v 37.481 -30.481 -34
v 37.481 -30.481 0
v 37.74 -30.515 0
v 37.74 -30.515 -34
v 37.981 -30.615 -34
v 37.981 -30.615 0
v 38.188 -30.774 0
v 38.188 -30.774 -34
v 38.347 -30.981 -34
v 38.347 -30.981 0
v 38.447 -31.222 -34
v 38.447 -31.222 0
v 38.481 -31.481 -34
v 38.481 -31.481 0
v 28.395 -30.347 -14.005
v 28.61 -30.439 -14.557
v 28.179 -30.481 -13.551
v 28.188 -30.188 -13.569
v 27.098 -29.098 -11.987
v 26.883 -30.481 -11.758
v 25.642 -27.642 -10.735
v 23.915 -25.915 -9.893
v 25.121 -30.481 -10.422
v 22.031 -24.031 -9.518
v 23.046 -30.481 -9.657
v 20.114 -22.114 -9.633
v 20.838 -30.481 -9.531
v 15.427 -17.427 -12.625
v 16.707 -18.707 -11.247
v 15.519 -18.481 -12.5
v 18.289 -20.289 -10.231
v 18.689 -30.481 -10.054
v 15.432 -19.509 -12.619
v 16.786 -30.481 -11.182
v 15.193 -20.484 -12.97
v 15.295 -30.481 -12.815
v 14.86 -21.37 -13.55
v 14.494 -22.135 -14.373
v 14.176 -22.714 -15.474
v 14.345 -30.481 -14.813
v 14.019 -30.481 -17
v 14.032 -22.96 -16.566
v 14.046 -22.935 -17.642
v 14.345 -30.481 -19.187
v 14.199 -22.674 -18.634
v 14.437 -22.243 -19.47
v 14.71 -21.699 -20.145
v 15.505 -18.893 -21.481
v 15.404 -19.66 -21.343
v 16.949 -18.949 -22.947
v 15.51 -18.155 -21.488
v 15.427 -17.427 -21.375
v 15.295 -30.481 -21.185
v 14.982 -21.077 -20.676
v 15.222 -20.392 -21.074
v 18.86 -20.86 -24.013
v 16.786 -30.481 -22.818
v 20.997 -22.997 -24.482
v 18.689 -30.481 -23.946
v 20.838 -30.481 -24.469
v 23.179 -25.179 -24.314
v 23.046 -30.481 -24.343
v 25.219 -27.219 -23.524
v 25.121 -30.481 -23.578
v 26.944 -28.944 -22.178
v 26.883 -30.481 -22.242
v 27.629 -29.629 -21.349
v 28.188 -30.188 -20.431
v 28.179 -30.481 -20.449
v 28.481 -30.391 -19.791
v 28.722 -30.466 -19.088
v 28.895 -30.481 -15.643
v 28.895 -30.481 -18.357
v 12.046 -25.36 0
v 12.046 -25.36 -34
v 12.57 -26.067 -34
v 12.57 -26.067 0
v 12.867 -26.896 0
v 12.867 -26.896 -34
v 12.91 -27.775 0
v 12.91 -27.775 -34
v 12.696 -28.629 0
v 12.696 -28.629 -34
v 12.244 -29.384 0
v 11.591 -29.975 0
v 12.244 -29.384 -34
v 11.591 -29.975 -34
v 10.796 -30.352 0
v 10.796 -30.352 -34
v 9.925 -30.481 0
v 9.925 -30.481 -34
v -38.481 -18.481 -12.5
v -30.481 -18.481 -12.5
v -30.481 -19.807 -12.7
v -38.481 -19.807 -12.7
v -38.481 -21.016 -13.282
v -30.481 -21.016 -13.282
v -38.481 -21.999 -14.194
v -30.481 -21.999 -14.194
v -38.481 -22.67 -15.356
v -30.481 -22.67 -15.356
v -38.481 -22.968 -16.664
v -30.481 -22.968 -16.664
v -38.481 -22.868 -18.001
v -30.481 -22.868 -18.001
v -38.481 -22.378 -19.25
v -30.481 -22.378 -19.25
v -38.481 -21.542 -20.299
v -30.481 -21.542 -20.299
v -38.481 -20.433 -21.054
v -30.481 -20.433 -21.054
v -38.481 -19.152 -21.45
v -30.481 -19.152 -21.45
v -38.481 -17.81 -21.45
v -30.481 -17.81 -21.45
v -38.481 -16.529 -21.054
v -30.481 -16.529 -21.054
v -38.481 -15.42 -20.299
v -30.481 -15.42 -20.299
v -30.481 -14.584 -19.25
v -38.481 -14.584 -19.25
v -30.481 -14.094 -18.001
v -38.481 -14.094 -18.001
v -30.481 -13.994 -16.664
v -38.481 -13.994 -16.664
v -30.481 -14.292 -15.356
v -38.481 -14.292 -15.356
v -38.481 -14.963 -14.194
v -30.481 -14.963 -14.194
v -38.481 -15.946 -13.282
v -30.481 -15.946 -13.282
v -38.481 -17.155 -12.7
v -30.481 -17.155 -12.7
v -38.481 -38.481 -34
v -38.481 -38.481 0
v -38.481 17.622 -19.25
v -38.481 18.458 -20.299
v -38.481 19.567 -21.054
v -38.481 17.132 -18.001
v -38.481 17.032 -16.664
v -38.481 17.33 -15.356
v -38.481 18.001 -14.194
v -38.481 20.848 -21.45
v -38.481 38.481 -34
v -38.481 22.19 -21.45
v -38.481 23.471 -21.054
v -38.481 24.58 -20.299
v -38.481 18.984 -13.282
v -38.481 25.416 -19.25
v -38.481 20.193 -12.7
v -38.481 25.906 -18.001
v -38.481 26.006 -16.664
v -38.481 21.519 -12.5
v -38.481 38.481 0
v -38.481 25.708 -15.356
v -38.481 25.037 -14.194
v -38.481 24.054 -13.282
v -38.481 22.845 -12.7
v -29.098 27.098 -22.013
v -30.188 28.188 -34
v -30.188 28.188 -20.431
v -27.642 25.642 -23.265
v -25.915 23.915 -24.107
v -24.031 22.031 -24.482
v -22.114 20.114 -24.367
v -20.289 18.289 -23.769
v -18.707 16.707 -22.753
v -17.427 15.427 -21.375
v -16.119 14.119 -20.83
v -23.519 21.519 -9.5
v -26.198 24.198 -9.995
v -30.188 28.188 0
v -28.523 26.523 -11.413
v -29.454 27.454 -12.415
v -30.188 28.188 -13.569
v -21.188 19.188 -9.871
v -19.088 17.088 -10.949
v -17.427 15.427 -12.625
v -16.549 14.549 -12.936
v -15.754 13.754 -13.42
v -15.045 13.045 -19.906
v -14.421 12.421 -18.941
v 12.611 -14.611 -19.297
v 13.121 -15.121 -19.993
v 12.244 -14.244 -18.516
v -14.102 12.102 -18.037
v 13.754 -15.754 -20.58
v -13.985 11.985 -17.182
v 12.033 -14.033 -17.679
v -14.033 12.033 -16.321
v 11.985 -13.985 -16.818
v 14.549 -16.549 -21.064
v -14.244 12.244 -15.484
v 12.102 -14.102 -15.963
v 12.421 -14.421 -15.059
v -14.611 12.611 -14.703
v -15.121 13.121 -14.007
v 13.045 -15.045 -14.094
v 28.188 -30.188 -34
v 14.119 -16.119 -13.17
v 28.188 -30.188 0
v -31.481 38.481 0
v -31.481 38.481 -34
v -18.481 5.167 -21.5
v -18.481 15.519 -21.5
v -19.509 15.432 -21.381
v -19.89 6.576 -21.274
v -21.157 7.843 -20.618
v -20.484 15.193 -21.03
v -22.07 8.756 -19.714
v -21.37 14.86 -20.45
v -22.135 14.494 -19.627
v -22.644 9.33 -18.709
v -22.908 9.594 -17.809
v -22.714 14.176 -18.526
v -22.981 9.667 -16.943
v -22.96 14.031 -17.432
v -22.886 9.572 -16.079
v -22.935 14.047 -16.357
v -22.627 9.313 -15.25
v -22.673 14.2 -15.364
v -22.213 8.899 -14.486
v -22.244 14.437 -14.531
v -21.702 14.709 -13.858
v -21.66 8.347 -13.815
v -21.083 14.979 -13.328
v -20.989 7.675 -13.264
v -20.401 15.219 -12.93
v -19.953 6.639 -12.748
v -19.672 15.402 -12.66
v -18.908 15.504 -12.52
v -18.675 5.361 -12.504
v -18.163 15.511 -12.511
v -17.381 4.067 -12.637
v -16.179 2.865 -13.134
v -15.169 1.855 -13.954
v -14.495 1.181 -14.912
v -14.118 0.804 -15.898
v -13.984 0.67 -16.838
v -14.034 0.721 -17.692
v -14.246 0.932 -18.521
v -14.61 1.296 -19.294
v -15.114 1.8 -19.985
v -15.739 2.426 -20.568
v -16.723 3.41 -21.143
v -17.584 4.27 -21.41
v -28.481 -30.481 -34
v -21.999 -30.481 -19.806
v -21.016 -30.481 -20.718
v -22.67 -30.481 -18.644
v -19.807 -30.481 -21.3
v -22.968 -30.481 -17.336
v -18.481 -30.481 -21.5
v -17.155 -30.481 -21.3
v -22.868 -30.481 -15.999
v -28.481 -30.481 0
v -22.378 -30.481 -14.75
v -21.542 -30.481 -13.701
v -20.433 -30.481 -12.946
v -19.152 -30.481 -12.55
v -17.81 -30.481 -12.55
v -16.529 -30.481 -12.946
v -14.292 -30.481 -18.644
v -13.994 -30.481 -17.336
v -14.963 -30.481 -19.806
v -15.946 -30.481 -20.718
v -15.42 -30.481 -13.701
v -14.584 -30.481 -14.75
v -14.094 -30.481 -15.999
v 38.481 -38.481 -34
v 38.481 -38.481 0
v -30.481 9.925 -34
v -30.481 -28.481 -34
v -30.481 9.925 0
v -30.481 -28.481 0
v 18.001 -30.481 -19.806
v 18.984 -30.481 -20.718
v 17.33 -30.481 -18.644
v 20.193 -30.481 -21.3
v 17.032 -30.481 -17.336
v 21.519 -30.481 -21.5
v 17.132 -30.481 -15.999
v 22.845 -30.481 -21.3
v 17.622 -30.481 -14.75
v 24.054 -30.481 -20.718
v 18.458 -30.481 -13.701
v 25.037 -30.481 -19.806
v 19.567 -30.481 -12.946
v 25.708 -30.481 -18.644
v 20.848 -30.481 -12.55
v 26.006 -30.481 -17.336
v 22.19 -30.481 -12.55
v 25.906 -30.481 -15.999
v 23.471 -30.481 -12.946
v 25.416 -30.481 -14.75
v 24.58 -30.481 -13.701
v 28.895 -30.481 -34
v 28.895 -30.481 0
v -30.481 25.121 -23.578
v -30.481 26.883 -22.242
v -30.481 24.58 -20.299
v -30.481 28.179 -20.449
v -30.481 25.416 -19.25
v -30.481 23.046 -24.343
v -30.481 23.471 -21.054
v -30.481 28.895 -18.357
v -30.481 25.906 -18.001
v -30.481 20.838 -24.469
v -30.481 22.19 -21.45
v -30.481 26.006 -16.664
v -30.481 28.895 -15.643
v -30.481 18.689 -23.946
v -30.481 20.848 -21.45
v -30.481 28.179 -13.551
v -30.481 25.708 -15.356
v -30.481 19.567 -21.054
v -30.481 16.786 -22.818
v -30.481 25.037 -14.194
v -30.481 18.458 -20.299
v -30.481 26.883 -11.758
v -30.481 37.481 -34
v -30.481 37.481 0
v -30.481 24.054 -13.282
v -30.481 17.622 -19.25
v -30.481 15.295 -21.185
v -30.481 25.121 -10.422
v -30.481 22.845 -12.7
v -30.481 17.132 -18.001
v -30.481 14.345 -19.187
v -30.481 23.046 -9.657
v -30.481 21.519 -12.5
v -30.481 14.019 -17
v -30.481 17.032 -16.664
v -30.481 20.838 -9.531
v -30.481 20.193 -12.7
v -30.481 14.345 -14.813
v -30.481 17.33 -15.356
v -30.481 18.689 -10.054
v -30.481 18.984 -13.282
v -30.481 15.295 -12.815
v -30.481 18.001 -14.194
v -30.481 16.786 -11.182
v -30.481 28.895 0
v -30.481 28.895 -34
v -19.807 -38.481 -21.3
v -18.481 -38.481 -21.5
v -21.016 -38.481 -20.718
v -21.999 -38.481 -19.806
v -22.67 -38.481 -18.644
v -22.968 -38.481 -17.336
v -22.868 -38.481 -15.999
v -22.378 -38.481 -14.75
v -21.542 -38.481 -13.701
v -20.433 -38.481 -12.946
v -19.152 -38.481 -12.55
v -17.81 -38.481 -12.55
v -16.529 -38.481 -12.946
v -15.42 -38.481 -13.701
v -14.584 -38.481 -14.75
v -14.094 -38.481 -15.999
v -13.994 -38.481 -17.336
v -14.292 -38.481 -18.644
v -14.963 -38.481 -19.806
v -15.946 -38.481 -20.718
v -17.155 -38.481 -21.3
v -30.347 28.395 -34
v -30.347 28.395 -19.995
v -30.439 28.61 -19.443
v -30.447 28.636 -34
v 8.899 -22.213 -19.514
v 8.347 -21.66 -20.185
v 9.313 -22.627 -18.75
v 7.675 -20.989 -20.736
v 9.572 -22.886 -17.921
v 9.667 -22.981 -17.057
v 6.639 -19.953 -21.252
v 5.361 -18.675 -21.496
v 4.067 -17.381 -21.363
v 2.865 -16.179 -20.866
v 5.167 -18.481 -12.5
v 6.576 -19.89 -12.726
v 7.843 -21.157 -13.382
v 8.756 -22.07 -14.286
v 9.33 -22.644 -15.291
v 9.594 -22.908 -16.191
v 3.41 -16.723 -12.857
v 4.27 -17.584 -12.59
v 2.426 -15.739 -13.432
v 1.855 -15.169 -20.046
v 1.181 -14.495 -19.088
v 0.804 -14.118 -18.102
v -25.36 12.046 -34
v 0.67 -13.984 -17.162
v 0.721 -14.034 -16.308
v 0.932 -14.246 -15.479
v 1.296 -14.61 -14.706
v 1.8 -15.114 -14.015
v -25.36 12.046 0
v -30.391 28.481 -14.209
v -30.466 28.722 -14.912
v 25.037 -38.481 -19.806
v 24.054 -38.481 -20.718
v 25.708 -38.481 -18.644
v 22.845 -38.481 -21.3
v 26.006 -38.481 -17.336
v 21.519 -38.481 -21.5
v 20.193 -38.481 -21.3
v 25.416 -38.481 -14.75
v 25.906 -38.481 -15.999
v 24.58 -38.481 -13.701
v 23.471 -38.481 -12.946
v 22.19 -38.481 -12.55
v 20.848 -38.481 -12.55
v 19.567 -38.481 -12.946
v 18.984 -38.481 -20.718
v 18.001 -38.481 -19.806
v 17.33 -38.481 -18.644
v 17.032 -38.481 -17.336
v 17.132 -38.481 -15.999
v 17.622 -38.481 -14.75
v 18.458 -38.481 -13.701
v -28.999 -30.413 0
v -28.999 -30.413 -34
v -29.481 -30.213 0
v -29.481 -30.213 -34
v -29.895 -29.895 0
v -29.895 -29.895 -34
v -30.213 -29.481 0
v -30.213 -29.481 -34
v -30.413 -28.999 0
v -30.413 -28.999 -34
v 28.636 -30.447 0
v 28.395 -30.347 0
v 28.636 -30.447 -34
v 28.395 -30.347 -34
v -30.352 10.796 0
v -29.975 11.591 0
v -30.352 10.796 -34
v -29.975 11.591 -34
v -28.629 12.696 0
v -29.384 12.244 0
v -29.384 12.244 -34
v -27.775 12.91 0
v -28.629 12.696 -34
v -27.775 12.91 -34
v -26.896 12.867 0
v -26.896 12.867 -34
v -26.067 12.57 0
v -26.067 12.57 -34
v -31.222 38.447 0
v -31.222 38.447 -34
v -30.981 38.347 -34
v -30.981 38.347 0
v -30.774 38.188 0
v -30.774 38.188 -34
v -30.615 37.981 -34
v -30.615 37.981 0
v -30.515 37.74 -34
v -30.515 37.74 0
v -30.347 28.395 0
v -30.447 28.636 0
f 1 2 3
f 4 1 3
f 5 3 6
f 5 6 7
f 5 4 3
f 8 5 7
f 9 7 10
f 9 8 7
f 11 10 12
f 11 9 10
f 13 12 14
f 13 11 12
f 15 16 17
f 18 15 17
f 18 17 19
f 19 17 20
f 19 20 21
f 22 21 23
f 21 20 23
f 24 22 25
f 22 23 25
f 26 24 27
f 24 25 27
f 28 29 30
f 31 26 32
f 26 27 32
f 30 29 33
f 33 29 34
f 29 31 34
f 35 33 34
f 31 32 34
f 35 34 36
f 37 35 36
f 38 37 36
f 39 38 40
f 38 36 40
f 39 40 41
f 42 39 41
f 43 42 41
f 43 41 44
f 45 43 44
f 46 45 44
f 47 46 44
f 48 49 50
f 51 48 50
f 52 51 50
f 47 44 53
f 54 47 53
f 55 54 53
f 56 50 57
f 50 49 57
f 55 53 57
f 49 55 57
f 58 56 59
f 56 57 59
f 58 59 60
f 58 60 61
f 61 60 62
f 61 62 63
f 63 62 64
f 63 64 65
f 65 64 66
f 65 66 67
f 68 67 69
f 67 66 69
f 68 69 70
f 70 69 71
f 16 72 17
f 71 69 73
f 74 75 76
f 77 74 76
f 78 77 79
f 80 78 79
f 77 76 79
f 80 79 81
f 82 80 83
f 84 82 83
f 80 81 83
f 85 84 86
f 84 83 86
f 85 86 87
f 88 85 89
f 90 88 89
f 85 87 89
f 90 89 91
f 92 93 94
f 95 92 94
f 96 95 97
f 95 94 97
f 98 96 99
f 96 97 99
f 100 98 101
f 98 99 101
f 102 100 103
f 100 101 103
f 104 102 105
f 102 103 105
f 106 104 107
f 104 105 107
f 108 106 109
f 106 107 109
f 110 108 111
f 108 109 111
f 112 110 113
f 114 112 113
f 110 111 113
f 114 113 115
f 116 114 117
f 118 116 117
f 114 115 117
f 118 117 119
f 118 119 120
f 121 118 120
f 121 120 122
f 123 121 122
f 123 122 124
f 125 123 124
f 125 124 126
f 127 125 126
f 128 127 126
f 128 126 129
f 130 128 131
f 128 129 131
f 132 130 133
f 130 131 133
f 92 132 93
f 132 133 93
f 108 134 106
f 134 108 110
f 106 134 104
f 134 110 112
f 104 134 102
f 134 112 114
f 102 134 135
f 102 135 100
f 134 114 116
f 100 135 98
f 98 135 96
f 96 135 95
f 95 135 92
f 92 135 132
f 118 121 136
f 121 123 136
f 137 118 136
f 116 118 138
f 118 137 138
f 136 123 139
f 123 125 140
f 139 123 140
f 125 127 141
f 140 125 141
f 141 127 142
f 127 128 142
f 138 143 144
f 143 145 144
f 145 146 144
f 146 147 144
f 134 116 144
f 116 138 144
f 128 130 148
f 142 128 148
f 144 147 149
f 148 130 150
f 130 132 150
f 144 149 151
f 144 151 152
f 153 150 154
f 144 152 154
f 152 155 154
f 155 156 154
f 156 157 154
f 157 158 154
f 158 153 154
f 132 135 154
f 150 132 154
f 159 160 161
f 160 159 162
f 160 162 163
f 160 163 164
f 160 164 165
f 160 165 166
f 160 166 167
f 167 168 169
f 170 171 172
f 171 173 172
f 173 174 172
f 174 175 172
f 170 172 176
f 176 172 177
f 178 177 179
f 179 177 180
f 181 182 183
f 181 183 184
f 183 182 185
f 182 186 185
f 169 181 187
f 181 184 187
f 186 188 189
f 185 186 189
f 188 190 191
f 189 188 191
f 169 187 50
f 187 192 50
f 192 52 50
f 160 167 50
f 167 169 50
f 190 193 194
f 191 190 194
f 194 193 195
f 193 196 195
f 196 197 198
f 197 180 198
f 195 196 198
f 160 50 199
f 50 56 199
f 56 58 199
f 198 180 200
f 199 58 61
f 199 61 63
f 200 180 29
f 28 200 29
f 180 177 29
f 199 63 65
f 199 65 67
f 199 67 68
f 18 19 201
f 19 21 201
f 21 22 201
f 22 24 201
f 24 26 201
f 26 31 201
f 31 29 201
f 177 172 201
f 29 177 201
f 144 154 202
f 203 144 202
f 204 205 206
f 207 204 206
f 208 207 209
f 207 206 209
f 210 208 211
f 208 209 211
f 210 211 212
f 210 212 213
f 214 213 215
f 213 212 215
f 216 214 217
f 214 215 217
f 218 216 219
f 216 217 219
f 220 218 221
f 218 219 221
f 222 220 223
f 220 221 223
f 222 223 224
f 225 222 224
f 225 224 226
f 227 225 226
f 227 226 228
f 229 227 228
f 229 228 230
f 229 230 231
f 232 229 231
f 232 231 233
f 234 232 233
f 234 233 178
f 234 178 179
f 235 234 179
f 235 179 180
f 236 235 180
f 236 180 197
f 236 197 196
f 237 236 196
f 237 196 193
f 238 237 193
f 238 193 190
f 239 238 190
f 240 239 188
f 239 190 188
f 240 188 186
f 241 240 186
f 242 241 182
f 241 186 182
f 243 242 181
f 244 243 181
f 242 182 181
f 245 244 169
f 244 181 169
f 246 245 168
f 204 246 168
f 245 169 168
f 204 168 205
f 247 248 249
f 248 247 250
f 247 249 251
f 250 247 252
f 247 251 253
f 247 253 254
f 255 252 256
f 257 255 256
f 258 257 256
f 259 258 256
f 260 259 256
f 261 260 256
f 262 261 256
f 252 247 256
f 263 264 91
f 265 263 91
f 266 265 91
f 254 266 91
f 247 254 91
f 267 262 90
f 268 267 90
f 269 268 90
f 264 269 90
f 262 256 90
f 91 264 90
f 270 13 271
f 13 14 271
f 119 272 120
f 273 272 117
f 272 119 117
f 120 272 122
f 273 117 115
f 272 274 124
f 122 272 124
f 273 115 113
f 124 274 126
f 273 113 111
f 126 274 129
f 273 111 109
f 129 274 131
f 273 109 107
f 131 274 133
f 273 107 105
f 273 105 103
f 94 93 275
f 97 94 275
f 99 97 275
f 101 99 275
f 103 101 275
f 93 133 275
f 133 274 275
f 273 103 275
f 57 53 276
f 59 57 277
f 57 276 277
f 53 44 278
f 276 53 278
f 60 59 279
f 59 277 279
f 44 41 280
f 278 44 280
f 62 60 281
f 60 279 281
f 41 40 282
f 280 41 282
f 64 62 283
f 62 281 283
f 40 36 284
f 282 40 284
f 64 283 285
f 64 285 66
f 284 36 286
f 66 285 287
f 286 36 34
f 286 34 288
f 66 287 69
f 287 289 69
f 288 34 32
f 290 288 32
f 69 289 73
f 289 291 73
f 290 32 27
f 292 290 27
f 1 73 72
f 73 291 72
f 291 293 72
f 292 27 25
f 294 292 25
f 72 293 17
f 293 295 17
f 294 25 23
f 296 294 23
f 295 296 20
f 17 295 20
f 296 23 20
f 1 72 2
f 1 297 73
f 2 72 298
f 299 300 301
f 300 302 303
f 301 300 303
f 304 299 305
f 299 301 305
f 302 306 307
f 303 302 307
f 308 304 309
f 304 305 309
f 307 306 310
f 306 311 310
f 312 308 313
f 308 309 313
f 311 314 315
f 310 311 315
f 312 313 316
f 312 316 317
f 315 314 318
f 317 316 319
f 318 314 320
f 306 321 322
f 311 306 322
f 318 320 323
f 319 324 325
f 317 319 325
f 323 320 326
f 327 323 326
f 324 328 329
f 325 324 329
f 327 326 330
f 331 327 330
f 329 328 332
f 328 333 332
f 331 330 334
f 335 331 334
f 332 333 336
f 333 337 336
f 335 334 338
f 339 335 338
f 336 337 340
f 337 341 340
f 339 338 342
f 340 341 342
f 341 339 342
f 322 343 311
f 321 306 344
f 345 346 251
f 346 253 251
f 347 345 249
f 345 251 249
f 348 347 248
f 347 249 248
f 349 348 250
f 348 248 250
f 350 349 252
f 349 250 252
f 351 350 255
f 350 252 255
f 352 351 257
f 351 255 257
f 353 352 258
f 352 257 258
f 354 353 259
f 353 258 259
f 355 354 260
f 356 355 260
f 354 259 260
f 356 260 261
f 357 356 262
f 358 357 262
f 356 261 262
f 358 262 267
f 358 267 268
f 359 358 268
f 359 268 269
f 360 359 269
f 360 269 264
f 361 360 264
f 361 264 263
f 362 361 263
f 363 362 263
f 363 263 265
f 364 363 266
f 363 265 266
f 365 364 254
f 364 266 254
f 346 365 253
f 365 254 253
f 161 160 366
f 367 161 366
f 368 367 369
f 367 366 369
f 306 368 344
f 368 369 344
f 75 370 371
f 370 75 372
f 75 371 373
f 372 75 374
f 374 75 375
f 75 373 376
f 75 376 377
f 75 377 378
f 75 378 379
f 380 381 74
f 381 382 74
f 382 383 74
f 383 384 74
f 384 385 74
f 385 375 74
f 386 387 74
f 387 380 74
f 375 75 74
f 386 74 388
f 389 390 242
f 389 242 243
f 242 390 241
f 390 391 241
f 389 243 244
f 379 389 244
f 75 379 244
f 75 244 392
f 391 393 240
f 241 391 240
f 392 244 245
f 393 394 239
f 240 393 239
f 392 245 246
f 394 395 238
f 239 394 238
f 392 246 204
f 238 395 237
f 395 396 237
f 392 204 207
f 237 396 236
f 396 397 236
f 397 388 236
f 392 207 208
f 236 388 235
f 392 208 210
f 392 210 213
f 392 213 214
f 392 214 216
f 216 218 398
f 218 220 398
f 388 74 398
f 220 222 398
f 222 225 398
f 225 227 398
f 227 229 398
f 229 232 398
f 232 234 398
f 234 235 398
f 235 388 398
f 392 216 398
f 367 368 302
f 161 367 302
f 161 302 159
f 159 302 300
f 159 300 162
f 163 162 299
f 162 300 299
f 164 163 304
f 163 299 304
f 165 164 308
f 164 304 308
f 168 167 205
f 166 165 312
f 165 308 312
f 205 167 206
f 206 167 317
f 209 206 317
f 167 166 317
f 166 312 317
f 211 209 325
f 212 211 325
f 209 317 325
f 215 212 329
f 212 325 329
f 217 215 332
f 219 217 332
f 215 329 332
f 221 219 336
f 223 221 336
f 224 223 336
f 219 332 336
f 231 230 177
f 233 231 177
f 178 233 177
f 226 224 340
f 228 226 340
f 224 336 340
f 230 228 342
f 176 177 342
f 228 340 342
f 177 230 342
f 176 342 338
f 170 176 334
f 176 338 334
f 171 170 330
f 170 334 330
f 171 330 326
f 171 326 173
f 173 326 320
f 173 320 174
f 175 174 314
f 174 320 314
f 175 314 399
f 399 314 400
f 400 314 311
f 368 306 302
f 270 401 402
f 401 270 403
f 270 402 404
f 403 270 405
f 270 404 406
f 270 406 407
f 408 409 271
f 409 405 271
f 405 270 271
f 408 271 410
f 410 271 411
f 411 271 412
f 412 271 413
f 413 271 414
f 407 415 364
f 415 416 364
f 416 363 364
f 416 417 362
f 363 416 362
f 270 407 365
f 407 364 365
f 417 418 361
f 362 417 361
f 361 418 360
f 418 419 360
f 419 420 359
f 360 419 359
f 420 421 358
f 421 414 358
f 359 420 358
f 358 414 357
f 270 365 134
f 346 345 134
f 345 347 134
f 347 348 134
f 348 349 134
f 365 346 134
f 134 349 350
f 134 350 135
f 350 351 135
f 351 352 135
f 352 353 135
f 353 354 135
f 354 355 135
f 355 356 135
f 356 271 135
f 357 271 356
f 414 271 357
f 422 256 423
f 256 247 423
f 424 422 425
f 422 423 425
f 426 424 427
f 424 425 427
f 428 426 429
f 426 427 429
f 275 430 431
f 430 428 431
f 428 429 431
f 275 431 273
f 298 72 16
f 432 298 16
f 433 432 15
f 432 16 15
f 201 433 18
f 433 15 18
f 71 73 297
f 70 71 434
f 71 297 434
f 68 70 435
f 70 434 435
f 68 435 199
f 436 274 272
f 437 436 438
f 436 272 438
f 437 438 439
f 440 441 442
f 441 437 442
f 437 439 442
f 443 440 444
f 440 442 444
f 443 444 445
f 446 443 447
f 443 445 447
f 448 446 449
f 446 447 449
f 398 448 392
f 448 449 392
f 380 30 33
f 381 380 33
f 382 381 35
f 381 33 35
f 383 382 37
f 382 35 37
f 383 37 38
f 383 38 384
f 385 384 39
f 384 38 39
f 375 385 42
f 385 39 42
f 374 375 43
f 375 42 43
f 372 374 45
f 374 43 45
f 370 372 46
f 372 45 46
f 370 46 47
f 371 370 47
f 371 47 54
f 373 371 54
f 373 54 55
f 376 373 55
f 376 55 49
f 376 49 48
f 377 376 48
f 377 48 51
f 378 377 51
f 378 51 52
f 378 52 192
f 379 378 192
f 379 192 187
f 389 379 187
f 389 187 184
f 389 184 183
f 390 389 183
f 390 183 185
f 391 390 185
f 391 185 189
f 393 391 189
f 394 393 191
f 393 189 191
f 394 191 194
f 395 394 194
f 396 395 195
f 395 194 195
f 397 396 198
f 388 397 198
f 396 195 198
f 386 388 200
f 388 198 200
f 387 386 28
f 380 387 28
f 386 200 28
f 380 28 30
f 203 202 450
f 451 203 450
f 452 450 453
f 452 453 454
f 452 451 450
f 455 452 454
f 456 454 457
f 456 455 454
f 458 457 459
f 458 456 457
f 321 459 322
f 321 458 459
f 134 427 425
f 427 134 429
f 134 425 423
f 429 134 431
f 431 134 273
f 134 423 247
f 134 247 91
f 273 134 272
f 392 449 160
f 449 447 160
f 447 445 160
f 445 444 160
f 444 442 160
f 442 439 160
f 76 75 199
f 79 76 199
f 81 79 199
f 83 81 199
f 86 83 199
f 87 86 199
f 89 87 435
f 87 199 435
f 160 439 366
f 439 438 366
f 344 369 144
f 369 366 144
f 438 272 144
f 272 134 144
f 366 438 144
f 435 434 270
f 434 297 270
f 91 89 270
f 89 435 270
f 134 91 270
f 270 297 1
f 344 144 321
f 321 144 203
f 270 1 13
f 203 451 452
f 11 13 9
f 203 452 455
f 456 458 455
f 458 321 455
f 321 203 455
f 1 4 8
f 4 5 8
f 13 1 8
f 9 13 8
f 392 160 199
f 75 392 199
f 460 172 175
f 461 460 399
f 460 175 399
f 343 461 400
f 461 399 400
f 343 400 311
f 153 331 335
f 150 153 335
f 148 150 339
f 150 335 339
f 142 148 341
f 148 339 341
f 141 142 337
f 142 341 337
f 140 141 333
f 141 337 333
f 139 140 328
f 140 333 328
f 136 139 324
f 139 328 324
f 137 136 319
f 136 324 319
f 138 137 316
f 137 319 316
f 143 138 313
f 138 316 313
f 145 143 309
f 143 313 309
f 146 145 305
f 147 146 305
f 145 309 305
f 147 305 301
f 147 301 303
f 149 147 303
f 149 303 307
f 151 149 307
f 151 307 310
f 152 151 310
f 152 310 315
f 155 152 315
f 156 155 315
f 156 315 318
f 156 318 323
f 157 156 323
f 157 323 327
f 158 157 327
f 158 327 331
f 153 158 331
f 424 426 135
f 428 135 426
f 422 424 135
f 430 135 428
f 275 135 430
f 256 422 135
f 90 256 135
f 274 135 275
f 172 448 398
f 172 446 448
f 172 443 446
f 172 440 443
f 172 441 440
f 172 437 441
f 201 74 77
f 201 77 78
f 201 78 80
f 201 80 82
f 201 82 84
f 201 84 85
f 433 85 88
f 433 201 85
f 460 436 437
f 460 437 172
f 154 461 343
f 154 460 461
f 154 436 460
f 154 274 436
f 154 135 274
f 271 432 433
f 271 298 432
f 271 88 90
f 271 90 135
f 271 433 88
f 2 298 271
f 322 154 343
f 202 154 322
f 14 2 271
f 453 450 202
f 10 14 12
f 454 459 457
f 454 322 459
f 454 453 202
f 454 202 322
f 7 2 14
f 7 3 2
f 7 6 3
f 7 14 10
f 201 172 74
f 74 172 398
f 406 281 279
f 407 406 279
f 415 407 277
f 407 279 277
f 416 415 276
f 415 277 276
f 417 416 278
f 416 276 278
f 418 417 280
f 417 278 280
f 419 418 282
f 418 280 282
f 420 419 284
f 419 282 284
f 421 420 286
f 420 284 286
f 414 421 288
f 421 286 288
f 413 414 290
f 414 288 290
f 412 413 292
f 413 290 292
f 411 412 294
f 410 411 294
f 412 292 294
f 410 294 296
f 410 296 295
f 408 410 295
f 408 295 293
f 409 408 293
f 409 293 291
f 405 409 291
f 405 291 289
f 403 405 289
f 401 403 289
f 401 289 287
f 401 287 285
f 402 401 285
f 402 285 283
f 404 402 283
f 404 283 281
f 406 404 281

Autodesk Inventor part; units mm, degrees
ref_plane "YZ Plane" through (0, 0, 0) normal (1, 0, 0) x (0, 1, 0)
sketch "Sketch1" plane through (0, 0, 0) normal (0, 0, 1) x (1, 0, 0)
  line L0 (-38.481, 38.481) -> (38.481, 38.481)
  line L1 (38.481, 38.481) -> (38.481, -38.481)
  line L2 (38.481, -38.481) -> (-38.481, -38.481)
  line L3 (-38.481, -38.481) -> (-38.481, 38.481)
  point P0 (0, 0)
  dimension "d0" = 76.962
  dimension "d1" = 76.962
  dimension "d2" = 38.481
  dimension "d3" = 38.481
extrude "Extrusion1" add sketch "Sketch1" against normal blind 34
sketch "Sketch2" plane through (0, 0, 0) normal (0, 0, 1) x (1, 0, 0)
  line L0 (-38.481, 38.481) -> (38.481, 38.481) projected
  line L1 (-38.481, -38.481) -> (-38.481, 38.481) projected
  line L2 (38.481, -38.481) -> (-38.481, -38.481) projected
  line L3 (38.481, 38.481) -> (38.481, -38.481) projected
  line L4 (-30.481, 38.481) -> (-30.481, 28.481)
  line L5 (-30.481, 28.481) -> (28.481, -30.481)
  line L6 (28.481, -30.481) -> (38.481, -30.481)
  line L7 (-30.481, 17.1673) -> (-30.481, -30.481)
  line L8 (-30.481, -30.481) -> (17.1673, -30.481)
  line L9 (17.1673, -30.481) -> (-30.481, 17.1673)
  dimension "d6" = 8
  dimension "d7" = 8
  dimension "d8" = 10
  dimension "d10" = 135
  dimension "d11" = 8
extrude "Extrusion2" cut sketch "Sketch2" against normal through all contours L0 L3 L6 L5 L4 | L9 L8 L7
fillet "Fillet1" radius 2 1 edges at (-30.481, -30.481, -17)
fillet "Fillet1" radius 1 4 edges at (-30.481, 38.481, -17) (-30.481, 28.481, -17) (28.481, -30.481, -17) (38.481, -30.481, -17)
fillet "Fillet1" radius 3 2 edges at (-30.481, 17.1673, -17) (17.1673, -30.481, -17)
sketch "Sketch3" plane through (-38.481, -38.481, 0) normal (-1, 0, 0) x (0, 0, 1)
  line L0 (0, 0) -> (-34, 0) projected
  line L1 (0, 0) -> (0, 76.962) projected
  point P0 (-17, 60)
  point P1 (-17, 20)
  dimension "d17" = 17
  dimension "d18" = 20
  dimension "d19" = 40
hole "Hole1" at (-38.481, 21.519, -17) at (-38.481, -18.481, -17) direction (1, 0, 0) diameter 9 end through all
sketch "Sketch4" plane through (-38.481, -38.481, 0) normal (0, -1, 0) x (1, 0, 0)
  line L0 (0, -34) -> (76.962, -34) projected
  line L1 (0, 0) -> (0, -34) projected
  point P0 (20, -17)
  point P1 (60, -17)
  dimension "d27" = 17
  dimension "d28" = 20
  dimension "d29" = 40
hole "Hole2" at (-18.481, -38.481, -17) at (21.519, -38.481, -17) direction (0, 1, 0) diameter 9 end through all
ref_plane "Work Plane1" through (-30.481, -38.481, 0) normal (-1, 0, 0) x (0, 0, 1)
ref_plane "Work Plane2" through (-38.481, -30.481, 0) normal (0, -1, 0) x (1, 0, 0)
sketch "Sketch5" plane through (-30.481, -38.481, 0) normal (-1, 0, 0) x (0, 0, 1)
  arc A0 (-13.2711, 57.481) -> (-20.7289, 57.481) centre (-17, 60) ccw projected
  circle A1 centre (-17, 60) radius 4.5 projected
  circle A2 centre (-17, 60) radius 7.5
  dimension "d39" = 15
extrude "Extrusion3" cut sketch "Sketch5" against normal through all
sketch "Sketch6" plane through (-38.481, -30.481, 0) normal (0, -1, 0) x (1, 0, 0)
  arc A0 (57.481, -20.7289) -> (57.481, -13.2711) centre (60, -17) ccw projected
  circle A1 centre (60, -17) radius 4.5 projected
  circle A2 centre (60, -17) radius 7.5
  dimension "d42" = 15
extrude "Extrusion4" cut sketch "Sketch6" against normal through all
ref_plane "OffsetPlane" through (0, 0, -17) normal (0, 0, 1) x (1, 0, 0)
equation "\"d2\" = 0.5 * d0"
equation "\"d3\" = 0.5 * d1"
properties part number "20-102" material "Alluminio - 6061"
